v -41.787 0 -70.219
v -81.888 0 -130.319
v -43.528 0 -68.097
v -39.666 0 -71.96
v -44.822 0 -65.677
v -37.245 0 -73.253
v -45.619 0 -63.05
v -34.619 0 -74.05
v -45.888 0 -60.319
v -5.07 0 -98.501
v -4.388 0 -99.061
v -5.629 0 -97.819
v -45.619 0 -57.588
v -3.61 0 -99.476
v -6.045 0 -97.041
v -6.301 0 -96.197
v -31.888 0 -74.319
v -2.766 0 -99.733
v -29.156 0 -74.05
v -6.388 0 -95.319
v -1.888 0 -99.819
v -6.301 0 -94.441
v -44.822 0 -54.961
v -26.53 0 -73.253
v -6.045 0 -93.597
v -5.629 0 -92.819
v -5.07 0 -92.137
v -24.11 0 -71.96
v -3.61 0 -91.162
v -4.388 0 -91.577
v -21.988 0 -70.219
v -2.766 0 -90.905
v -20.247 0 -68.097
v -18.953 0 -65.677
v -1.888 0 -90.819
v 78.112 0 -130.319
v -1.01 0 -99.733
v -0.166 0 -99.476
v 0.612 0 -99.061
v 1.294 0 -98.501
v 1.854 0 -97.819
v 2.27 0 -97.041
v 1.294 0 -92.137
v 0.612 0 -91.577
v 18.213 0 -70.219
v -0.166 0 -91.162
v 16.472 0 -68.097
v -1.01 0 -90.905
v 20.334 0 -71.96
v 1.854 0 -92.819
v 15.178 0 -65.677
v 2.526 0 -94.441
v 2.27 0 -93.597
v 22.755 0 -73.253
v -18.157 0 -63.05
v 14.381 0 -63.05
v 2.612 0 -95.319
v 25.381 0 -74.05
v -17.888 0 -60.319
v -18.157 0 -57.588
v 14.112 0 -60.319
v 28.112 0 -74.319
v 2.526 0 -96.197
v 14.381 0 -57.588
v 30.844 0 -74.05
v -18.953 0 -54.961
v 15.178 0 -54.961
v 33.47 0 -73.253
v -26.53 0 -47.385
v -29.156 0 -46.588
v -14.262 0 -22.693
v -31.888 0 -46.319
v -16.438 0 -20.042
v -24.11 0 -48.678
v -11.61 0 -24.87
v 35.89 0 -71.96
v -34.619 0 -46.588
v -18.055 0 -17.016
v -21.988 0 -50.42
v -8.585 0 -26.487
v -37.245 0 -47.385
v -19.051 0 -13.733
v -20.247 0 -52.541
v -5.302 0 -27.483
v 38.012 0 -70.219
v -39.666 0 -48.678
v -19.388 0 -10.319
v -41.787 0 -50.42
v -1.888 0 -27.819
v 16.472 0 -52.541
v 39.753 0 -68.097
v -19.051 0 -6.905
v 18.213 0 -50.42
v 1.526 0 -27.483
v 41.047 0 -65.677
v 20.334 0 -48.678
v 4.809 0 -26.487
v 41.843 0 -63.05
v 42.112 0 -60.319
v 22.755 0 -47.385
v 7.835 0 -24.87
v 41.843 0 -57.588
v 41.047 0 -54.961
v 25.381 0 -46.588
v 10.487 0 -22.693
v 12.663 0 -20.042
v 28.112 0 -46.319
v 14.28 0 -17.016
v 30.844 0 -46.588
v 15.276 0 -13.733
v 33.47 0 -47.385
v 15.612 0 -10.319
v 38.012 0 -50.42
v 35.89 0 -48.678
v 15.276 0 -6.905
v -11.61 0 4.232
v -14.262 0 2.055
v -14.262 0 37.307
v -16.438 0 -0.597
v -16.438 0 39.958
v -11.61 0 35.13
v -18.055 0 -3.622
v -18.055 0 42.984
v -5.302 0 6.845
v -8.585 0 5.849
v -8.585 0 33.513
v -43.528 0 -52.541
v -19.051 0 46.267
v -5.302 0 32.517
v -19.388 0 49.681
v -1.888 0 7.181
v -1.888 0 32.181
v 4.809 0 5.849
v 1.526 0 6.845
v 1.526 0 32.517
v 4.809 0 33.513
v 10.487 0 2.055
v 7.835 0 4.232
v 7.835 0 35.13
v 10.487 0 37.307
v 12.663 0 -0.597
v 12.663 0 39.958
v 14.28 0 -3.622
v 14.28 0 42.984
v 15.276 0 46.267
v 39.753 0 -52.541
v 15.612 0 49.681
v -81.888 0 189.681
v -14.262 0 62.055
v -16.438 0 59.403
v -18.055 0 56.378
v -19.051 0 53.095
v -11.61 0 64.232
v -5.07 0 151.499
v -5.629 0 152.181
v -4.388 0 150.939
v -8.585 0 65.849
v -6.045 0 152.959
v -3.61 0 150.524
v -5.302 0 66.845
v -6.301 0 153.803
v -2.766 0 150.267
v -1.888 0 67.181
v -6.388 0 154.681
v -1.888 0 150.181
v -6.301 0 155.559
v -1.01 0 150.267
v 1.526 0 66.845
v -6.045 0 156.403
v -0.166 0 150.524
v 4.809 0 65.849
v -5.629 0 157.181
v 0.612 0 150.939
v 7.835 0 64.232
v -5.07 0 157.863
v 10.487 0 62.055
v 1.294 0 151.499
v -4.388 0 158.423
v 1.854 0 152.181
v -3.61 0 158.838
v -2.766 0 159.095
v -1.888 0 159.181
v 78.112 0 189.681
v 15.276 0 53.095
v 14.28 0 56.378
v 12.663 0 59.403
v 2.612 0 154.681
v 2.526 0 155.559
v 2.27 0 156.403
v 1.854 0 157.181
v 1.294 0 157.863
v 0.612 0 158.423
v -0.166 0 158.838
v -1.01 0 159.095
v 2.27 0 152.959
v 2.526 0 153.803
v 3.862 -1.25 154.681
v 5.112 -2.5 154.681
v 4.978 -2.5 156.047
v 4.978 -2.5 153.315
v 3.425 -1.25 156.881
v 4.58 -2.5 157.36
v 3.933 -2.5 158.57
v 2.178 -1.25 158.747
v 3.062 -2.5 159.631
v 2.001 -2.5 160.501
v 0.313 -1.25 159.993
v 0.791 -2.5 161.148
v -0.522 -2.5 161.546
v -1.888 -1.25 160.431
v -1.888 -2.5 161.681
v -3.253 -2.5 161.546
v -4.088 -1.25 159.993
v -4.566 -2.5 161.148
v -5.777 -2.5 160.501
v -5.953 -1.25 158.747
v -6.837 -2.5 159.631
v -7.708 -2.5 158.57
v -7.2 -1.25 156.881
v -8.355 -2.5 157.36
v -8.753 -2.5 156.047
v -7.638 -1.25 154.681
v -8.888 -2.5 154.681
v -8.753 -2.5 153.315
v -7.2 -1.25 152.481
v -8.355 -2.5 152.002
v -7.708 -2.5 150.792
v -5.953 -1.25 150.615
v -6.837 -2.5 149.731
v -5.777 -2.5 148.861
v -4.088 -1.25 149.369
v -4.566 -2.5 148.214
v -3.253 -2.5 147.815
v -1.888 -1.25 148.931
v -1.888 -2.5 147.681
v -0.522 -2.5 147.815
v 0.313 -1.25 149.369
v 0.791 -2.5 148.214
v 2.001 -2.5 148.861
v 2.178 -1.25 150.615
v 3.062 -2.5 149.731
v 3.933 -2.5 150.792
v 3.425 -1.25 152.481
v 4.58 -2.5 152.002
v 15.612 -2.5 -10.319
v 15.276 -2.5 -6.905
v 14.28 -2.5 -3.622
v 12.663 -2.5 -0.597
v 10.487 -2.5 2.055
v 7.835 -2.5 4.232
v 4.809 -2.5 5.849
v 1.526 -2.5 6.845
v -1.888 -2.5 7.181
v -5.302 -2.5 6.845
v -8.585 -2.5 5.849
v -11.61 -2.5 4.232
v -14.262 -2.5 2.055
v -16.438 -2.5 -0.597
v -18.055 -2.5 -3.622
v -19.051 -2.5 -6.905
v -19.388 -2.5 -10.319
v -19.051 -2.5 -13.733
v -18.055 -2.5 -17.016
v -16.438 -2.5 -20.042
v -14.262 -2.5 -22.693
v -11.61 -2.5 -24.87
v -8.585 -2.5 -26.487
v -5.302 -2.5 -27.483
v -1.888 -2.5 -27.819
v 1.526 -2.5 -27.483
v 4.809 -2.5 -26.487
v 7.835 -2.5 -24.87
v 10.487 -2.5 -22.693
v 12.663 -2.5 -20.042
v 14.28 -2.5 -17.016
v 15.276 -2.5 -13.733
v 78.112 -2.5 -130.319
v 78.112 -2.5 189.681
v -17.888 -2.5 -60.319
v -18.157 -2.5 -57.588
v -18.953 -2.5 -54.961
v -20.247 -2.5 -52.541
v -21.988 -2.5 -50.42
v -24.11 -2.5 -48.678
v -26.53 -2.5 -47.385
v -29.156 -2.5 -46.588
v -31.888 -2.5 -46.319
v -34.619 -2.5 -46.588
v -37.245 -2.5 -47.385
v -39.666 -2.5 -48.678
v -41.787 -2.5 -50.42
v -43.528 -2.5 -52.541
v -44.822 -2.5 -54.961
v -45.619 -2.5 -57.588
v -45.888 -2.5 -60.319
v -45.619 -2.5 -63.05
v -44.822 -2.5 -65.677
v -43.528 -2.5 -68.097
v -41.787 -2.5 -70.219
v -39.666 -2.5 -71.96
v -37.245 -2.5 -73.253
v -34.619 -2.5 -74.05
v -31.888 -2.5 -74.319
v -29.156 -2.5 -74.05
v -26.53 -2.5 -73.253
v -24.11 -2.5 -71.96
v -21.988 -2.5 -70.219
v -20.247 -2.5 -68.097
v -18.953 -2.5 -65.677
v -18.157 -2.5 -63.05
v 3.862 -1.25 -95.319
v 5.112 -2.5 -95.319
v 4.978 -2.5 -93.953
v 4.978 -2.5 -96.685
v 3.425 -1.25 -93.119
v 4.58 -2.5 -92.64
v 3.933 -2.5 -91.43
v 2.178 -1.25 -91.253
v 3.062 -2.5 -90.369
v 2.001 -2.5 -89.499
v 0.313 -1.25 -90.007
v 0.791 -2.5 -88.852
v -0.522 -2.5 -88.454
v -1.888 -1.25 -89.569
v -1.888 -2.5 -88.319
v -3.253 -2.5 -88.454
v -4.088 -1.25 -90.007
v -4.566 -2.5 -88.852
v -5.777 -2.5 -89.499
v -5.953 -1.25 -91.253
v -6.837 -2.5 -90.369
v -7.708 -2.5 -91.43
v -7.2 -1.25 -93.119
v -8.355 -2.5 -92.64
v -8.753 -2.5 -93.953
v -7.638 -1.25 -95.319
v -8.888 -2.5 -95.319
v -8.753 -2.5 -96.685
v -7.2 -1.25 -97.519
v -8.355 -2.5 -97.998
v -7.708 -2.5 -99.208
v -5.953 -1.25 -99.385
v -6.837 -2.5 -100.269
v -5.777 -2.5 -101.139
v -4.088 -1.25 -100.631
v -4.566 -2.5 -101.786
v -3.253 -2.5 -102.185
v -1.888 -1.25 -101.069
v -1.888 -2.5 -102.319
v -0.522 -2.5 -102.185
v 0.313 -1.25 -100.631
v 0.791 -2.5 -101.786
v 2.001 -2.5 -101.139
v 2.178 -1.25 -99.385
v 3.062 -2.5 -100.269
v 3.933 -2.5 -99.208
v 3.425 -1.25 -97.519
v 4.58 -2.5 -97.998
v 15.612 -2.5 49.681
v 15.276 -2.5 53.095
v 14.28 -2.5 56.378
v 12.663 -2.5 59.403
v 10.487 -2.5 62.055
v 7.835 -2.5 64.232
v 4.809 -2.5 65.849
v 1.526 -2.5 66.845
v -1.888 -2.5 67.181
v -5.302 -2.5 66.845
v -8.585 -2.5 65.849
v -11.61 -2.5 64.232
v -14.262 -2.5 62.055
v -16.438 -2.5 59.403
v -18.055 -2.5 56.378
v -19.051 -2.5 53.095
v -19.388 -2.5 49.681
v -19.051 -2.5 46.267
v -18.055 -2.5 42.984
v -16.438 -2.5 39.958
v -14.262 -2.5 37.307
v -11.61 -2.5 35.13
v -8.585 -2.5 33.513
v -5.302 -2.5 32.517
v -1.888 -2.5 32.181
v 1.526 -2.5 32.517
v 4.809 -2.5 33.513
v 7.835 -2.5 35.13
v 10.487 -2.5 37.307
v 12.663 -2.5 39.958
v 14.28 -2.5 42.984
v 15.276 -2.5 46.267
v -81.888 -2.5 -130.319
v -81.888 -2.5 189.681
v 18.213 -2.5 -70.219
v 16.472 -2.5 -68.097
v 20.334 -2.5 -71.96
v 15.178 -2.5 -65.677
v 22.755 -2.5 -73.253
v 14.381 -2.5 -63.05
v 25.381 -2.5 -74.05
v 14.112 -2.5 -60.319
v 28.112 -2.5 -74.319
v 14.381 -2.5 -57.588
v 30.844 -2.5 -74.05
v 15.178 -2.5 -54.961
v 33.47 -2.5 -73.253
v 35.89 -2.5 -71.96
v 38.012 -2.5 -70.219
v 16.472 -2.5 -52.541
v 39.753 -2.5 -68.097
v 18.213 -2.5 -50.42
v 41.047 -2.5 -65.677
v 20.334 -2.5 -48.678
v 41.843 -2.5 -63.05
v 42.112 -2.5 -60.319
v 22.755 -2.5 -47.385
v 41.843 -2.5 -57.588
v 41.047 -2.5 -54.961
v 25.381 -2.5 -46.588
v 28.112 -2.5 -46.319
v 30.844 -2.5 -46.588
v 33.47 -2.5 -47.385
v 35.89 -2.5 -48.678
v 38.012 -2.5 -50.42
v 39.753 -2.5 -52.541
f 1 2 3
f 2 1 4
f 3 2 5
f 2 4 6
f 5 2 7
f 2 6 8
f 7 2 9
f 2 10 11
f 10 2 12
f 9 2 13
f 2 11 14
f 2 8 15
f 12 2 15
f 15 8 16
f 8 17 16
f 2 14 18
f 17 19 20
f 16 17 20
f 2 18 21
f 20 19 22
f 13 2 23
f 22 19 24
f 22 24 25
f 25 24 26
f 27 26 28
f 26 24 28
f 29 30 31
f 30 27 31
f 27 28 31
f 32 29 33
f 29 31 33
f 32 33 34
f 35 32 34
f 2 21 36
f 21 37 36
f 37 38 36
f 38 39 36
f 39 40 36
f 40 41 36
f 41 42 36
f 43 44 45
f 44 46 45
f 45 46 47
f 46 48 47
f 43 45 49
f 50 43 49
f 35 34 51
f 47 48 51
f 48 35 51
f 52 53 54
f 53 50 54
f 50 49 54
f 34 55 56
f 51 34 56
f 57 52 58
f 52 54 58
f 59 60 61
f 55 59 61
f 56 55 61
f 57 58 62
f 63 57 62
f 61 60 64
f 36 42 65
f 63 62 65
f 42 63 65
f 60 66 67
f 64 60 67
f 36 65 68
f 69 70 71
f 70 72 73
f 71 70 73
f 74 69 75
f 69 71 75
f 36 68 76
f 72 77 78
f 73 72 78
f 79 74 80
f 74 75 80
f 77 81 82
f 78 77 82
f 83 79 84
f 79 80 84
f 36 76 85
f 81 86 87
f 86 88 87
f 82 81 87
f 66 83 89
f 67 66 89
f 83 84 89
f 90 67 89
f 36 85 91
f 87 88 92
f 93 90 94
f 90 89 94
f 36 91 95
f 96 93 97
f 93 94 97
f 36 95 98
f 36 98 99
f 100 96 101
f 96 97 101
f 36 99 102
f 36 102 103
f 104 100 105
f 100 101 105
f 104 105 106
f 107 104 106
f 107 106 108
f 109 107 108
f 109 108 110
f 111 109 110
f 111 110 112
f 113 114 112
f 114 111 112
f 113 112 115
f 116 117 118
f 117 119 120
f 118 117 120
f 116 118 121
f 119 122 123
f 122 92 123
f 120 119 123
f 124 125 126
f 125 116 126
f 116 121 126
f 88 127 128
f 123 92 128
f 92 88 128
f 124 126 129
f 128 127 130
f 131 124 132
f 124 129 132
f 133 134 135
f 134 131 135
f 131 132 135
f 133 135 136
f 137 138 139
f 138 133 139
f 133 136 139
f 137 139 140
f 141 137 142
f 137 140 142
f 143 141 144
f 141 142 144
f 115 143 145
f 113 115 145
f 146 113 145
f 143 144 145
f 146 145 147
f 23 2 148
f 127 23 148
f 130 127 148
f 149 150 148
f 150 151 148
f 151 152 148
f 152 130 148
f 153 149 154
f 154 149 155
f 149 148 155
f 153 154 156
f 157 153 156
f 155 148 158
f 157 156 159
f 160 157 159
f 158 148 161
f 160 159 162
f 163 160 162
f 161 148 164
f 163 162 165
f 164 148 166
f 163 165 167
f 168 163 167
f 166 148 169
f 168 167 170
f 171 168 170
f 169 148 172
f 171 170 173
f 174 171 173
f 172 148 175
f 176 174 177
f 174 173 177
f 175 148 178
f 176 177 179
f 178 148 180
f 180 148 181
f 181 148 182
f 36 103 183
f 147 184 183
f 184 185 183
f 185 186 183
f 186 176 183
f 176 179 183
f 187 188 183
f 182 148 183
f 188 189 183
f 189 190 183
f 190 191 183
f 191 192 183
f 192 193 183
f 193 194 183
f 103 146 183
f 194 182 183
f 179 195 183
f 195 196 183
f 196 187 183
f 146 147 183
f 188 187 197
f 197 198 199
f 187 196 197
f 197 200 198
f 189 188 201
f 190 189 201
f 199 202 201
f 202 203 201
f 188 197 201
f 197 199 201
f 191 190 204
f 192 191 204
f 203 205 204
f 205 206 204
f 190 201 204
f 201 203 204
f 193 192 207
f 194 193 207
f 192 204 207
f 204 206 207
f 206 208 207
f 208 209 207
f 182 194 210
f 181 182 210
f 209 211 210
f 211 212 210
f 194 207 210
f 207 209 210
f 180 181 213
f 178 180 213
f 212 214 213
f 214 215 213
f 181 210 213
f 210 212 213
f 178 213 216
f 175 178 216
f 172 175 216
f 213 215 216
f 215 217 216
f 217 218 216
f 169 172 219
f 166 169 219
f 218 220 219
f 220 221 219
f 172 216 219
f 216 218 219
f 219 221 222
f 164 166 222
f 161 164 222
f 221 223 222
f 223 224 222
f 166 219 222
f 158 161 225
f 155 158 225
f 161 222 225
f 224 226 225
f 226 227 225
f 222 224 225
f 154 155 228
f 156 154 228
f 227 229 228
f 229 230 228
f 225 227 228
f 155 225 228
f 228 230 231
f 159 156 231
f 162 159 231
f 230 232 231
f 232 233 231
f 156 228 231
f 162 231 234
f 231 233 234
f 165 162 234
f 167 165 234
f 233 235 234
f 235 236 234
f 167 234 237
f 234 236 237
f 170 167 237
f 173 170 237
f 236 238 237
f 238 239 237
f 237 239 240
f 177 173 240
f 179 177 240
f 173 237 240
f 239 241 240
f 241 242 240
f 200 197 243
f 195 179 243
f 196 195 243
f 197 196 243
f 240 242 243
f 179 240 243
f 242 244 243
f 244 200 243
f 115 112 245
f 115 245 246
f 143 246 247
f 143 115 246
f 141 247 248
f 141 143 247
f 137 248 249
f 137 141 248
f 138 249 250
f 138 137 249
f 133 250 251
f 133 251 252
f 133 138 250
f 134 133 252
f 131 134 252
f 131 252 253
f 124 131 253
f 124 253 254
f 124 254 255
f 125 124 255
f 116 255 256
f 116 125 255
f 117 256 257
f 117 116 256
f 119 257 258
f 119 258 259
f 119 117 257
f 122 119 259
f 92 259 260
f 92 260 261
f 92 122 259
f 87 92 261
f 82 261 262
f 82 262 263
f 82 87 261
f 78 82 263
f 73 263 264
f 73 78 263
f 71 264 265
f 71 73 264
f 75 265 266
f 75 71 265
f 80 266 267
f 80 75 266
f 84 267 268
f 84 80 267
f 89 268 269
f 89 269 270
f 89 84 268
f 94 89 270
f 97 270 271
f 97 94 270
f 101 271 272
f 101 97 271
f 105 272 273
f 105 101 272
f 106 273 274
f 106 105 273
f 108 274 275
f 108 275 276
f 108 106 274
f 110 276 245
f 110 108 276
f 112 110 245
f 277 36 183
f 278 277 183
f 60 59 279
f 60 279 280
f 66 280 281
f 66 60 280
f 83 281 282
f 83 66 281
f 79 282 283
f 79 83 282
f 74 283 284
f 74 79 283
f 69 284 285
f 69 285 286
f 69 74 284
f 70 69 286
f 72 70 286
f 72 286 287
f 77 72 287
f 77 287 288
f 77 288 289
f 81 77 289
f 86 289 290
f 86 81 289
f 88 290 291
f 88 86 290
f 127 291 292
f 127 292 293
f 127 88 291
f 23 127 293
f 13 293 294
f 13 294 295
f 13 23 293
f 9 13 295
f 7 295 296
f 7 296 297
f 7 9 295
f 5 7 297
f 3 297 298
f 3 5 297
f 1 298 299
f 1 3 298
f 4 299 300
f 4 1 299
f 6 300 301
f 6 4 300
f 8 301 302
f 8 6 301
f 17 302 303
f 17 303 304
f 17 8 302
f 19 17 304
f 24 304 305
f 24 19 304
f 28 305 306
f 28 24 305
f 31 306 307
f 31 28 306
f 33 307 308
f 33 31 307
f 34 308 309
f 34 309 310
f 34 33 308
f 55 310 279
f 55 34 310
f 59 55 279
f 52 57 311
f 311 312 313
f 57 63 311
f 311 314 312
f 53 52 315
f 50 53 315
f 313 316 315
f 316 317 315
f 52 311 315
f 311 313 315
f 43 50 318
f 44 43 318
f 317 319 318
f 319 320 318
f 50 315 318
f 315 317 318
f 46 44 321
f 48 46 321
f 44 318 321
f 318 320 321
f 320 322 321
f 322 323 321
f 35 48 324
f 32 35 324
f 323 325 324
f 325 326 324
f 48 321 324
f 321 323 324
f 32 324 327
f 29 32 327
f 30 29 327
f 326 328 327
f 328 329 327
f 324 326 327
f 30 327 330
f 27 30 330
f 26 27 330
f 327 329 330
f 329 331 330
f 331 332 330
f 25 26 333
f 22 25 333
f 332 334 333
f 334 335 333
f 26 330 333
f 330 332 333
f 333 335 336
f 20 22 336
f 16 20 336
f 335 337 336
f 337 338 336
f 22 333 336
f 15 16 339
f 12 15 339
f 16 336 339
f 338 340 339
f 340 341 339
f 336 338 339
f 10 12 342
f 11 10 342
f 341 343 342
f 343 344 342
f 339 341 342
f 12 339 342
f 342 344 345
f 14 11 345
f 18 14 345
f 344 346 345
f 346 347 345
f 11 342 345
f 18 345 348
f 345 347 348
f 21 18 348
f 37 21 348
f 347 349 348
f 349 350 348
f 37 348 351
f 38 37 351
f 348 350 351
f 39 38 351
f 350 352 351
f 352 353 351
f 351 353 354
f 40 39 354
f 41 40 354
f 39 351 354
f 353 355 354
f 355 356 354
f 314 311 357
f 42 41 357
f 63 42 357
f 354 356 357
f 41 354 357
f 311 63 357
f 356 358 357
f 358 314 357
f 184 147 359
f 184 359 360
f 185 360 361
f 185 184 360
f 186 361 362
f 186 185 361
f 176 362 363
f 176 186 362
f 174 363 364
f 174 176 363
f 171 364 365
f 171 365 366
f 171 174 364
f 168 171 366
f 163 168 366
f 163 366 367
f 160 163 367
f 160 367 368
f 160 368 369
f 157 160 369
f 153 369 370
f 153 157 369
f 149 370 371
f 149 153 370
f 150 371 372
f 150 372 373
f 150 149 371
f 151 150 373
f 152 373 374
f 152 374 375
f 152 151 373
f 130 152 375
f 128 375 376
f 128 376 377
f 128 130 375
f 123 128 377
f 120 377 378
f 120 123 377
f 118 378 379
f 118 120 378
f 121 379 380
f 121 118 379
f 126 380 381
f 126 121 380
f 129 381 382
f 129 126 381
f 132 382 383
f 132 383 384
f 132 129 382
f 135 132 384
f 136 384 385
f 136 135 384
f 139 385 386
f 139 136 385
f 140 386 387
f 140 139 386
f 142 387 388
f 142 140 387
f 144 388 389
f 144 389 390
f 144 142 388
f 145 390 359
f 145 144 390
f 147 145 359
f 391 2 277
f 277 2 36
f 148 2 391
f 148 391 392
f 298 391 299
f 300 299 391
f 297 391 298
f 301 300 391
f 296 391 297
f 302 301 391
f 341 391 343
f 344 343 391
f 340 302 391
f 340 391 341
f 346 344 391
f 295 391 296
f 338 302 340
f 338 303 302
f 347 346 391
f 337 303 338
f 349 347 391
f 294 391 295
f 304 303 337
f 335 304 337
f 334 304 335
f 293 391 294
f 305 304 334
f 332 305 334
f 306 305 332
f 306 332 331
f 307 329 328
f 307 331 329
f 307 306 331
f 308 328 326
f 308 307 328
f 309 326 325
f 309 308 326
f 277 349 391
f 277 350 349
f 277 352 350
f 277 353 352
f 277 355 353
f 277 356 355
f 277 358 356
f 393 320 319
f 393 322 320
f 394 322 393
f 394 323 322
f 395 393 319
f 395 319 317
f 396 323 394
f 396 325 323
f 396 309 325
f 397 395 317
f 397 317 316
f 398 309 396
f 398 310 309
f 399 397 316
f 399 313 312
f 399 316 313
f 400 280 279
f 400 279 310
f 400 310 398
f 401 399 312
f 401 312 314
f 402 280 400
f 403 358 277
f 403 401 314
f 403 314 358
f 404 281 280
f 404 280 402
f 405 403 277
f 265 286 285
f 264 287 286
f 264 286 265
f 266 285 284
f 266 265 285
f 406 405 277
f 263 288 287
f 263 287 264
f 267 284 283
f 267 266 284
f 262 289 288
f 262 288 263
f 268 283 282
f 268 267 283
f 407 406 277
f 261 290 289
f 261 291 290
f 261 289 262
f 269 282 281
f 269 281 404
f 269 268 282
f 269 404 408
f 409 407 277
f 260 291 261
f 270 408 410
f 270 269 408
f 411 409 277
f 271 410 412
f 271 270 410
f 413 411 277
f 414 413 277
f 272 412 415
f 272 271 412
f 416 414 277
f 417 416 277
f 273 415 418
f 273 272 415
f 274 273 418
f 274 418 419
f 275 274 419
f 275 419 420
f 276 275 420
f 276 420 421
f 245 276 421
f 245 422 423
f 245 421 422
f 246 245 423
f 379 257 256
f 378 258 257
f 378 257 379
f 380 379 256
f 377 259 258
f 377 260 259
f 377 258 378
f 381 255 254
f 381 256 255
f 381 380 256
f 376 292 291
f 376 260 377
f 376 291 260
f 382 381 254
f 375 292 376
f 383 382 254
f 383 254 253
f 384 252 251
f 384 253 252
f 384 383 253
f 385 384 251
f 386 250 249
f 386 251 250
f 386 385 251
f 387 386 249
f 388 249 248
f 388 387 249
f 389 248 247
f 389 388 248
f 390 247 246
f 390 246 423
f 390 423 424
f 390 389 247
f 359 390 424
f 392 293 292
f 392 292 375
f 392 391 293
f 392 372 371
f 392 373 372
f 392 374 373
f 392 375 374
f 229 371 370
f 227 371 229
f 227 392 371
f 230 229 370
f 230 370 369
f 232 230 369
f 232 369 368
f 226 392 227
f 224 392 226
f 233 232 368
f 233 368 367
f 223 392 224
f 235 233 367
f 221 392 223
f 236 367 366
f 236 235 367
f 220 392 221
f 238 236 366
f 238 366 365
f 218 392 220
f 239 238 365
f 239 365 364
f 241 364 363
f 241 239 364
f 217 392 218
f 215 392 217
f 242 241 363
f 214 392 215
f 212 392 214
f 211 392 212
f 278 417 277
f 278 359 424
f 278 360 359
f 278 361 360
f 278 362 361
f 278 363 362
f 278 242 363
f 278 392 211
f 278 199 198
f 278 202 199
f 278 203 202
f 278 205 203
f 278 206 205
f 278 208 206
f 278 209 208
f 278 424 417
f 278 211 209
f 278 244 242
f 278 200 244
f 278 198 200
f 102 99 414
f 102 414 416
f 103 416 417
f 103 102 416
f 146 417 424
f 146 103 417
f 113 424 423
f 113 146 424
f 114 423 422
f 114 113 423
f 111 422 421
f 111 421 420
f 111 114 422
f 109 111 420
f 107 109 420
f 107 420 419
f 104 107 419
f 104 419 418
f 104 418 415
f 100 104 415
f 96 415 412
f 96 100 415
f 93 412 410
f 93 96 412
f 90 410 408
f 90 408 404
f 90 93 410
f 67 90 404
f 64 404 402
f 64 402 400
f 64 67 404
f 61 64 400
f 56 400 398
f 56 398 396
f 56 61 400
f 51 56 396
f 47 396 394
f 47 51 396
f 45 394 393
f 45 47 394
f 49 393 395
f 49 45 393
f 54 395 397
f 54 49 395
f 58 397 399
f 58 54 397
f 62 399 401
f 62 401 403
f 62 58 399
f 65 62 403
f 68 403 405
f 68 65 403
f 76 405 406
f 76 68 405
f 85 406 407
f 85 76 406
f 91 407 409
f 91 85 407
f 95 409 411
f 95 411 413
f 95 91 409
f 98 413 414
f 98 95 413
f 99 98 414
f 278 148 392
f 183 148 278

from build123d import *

# Parameters (mm, degrees)
F0_W     = 160
F0_H     = 320
F0_R     = 14
F0_R_2   = 3
F0_R_3   = 17.5
F1_DEPTH = 2.5


# Not quite as in the source:
# - a fillet or chamfer that OpenCascade refuses, or shapes differently, is made with other operations: its cross-section is extruded or revolved along the edge and cut away or added


with BuildPart() as f1:
    # F0 (on Front) → F1 (new body)
    with BuildSketch(Plane.XZ):
        with Locations((-1.8876045942, 29.6809725389)):
            Rectangle(F0_W, F0_H)
        with Locations((-31.8876045942, -60.3190274611)):
            Circle(F0_R, mode=Mode.SUBTRACT)
        with Locations((-1.8876045942, -95.3190274611)):
            Circle(F0_R_2, mode=Mode.SUBTRACT)
        with Locations((28.1123954058, -60.3190274611)):
            Circle(F0_R, mode=Mode.SUBTRACT)
        with Locations((-1.8876045942, -10.3190274611)):
            Circle(F0_R_3, mode=Mode.SUBTRACT)
        with Locations((-1.8876045942, 49.6809725389)):
            Circle(F0_R_3, mode=Mode.SUBTRACT)
        with Locations((-1.8876045942, 154.6809725389)):
            Circle(F0_R_2, mode=Mode.SUBTRACT)
    extrude(amount=F1_DEPTH)

    # F2: chamfer of 4 on 2 edges, made by hand

    # F2_s1 → F2_t2 (revolve, cut)
    with BuildSketch(Plane.XY.offset(154.6809725389)):
        Polygon((1.1123954058, 1.5), (5.1123954058, -2.5), (1.1123954058, -2.5), align=None)
    revolve(axis=Axis((-1.8876045942, -2.5, 154.6809725389), (0, -1, 0)), mode=Mode.SUBTRACT)

    # F2_s3 → F2_t4 (revolve, cut)
    with BuildSketch(Plane.XY.offset(-95.3190274611)):
        Polygon((1.1123954058, 1.5), (5.1123954058, -2.5), (1.1123954058, -2.5), align=None)
    revolve(axis=Axis((-1.8876045942, -2.5, -95.3190274611), (0, -1, 0)), mode=Mode.SUBTRACT)


solid = f1.part
